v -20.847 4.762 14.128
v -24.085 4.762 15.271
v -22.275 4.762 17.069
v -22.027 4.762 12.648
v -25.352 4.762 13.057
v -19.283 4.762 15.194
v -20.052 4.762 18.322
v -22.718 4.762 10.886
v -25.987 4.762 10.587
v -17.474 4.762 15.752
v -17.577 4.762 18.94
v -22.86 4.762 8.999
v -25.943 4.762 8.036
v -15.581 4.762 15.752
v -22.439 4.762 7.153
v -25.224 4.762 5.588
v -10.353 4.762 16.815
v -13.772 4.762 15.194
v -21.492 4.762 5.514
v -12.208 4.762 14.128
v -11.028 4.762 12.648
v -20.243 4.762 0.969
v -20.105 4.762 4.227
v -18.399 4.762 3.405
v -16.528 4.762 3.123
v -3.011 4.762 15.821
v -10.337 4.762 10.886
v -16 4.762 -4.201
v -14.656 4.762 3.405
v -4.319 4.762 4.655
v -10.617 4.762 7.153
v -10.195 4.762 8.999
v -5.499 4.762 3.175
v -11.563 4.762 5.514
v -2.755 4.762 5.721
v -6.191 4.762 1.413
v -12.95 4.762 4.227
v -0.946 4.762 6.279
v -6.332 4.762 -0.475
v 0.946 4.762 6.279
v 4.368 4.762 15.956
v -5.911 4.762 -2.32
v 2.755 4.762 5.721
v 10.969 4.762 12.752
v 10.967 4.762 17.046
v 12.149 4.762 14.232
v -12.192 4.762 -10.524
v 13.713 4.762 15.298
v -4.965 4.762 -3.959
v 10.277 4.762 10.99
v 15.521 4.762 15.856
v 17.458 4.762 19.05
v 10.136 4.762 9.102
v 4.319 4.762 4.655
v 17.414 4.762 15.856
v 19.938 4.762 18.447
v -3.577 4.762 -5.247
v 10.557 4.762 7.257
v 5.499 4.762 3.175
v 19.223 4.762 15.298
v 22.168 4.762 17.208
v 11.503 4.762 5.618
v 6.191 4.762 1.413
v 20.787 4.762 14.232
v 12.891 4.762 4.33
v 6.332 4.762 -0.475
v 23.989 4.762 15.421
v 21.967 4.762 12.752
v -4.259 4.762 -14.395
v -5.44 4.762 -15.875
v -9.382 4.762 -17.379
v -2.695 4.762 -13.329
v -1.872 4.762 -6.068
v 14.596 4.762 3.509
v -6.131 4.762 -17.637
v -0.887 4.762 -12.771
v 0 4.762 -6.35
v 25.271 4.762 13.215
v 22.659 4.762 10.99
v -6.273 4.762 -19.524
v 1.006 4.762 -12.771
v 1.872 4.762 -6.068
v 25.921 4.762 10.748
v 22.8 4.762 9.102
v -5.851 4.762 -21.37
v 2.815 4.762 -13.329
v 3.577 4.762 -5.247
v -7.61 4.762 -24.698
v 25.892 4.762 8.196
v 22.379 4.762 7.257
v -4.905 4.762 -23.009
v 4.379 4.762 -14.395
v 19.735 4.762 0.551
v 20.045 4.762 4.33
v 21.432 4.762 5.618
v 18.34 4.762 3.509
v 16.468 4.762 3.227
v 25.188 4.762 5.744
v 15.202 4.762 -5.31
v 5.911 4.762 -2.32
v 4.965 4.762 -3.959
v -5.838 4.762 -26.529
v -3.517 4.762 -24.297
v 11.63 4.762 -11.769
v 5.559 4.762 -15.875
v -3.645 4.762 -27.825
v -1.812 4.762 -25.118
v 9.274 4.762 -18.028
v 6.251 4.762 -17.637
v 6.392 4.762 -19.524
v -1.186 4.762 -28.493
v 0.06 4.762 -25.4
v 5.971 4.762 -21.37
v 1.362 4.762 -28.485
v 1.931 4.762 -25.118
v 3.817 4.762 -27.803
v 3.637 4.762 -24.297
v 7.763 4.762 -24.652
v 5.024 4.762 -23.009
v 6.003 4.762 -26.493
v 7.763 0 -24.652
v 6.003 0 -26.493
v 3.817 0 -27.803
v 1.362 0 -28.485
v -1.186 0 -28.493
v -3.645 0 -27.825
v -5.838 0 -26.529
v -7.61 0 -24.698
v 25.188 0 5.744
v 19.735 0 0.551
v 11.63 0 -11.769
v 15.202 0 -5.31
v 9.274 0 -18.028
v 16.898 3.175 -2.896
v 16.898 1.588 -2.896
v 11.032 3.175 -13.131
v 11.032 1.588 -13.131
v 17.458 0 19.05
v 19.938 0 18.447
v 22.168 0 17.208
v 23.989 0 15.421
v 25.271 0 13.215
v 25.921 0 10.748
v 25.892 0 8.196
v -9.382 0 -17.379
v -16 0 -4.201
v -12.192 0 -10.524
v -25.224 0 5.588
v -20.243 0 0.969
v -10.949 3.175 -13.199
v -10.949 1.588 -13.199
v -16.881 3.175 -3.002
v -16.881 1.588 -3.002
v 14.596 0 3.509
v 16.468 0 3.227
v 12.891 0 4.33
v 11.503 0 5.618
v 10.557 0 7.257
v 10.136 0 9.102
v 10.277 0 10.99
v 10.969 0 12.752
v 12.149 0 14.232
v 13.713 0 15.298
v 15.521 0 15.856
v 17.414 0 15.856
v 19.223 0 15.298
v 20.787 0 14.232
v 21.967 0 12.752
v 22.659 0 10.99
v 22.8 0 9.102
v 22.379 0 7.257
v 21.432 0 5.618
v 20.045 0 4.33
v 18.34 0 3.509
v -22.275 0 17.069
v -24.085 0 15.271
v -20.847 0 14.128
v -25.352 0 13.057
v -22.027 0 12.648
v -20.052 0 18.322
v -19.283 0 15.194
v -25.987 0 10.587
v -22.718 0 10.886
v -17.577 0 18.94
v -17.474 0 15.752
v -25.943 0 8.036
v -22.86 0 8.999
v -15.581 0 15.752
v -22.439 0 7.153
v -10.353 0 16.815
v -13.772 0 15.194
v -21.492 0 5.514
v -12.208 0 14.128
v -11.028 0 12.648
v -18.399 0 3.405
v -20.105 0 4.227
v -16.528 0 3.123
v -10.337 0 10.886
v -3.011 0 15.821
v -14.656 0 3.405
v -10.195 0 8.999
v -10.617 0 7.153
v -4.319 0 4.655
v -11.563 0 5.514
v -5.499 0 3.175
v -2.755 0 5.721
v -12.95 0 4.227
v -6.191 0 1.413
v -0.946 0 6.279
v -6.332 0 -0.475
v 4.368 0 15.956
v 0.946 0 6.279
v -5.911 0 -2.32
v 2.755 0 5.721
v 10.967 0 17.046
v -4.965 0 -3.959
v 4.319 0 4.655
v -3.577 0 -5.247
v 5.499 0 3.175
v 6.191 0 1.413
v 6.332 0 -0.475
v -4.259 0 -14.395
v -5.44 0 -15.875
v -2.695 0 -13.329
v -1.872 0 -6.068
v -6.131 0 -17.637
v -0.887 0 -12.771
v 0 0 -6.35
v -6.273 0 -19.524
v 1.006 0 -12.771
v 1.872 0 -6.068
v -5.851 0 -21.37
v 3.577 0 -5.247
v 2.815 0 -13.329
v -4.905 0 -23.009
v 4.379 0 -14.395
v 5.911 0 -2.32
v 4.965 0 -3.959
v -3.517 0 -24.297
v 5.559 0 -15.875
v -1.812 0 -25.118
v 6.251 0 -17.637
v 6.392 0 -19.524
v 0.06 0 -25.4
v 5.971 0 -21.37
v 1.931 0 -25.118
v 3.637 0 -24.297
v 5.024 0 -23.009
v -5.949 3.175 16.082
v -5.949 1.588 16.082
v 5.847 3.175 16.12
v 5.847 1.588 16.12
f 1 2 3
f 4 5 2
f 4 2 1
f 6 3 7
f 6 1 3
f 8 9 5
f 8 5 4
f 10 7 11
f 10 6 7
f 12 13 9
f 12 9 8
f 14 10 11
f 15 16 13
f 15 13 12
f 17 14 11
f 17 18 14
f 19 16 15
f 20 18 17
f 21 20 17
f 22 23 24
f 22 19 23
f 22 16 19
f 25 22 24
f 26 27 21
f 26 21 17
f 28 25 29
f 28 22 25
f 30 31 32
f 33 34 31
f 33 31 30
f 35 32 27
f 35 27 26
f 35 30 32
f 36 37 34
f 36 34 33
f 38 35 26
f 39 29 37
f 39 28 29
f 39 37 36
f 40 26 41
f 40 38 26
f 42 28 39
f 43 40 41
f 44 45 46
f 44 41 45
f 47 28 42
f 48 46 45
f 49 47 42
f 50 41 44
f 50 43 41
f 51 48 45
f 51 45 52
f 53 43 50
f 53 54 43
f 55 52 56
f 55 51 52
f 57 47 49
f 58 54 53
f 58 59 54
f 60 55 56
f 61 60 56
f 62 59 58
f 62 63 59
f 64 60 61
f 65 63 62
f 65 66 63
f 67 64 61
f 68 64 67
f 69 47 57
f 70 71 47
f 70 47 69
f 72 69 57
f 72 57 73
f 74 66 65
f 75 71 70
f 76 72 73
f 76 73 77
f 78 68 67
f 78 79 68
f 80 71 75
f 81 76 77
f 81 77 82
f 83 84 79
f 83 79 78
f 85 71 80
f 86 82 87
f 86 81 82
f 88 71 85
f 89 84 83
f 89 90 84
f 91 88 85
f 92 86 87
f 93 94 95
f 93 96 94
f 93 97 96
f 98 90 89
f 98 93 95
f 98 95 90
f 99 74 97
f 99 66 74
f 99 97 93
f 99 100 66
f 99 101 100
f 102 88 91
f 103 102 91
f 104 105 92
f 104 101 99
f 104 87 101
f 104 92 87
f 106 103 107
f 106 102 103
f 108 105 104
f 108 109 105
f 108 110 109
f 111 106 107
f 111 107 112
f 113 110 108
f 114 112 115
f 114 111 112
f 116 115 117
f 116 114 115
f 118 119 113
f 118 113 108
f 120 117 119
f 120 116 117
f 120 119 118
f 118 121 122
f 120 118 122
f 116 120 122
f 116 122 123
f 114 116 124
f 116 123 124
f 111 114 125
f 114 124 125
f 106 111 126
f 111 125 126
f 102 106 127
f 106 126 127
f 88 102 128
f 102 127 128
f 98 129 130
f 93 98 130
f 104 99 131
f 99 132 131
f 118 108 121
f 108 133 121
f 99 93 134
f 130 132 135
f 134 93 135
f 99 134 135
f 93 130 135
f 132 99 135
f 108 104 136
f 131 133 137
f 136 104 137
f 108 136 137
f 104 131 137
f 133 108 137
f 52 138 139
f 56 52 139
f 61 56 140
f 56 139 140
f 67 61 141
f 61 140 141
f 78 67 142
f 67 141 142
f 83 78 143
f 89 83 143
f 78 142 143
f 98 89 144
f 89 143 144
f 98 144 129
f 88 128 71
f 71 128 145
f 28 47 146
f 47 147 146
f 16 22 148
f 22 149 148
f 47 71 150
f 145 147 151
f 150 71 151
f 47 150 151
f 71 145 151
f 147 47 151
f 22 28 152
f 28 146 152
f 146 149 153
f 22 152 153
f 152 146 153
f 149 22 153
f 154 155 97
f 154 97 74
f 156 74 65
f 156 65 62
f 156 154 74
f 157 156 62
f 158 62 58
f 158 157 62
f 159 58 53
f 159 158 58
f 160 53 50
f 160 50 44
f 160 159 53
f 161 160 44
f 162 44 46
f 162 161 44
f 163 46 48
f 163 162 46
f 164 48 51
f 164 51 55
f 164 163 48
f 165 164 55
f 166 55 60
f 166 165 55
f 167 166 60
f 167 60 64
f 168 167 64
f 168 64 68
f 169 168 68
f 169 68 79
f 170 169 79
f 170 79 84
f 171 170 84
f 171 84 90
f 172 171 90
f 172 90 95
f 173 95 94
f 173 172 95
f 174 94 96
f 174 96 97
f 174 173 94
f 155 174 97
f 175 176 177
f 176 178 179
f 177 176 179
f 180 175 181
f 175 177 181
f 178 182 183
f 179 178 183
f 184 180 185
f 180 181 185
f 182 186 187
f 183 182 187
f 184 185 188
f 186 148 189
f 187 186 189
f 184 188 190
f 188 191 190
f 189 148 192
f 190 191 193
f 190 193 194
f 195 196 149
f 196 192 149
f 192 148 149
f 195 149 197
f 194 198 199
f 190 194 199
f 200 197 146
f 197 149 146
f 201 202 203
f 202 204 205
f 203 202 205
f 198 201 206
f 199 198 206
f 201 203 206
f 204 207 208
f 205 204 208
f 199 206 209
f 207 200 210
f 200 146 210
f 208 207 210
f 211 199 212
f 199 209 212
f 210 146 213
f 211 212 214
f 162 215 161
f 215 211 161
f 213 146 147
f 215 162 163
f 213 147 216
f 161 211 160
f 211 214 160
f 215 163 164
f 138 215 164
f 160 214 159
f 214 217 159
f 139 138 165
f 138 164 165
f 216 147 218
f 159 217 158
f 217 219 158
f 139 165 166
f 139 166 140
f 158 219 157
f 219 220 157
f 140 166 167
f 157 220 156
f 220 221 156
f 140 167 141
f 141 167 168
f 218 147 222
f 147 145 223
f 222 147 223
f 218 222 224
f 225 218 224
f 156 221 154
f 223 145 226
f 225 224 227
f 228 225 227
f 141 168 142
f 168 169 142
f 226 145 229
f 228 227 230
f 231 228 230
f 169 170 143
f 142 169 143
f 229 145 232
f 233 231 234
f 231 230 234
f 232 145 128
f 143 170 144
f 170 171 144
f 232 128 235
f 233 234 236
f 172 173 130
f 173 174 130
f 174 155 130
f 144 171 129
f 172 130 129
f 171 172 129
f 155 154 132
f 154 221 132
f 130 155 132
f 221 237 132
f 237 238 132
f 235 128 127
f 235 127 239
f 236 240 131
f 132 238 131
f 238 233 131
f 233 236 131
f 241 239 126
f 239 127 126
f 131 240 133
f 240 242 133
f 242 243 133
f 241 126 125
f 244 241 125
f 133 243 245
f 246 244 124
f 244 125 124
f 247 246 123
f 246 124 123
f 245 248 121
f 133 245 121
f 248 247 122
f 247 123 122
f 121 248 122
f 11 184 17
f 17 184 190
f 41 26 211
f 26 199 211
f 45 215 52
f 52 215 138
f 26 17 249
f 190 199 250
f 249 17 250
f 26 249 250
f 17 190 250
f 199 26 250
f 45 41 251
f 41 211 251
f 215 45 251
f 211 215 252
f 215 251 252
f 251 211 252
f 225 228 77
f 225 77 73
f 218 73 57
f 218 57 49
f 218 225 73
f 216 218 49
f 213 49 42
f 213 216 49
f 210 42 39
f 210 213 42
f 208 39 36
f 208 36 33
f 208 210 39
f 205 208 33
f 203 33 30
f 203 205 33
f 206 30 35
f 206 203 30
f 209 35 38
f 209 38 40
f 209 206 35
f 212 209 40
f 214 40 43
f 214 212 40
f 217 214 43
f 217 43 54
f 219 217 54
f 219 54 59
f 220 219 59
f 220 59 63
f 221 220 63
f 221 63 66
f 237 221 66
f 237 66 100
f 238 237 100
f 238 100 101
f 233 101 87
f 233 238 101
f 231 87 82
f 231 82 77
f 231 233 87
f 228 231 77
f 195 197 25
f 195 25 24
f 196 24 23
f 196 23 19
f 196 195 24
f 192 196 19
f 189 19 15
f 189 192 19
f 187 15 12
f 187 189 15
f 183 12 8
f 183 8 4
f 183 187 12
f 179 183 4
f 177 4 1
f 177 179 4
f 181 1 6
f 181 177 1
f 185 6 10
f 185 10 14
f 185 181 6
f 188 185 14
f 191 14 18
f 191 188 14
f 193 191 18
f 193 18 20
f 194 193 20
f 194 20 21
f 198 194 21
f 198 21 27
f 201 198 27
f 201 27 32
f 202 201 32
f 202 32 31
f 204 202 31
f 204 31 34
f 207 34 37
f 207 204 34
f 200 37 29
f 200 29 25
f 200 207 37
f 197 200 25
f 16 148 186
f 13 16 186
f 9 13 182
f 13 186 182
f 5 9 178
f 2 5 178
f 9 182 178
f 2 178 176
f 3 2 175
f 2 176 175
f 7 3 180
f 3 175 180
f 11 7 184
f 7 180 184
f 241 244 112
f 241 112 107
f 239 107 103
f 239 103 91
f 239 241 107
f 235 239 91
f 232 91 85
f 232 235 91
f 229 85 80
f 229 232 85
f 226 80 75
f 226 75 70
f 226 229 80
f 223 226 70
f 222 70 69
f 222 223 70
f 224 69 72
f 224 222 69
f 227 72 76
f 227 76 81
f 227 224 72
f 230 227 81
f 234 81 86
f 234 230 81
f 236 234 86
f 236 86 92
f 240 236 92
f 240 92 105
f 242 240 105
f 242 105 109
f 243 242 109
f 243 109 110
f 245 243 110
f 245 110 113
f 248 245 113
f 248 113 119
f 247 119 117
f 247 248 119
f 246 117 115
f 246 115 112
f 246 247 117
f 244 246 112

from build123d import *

# Parameters (mm, degrees)
SKETCH2_R           = 6.35
BOSS_EXTRUDE1_DEPTH = 4.7625


with BuildPart() as part:
    # Sketch2 → Boss-Extrude1 (new body)
    with BuildSketch(Plane(origin=(0, 0, 0), x_dir=(1, 0, 0), z_dir=(0, 1, 0))):
        with BuildLine():
            ThreePointArc((7.763480479, 24.65151799), (0.088455744, 28.574863042), (-7.61008297, 24.69786127))
            add(Edge.make_bspline(
                [(-7.61008297, 24.69786127), (-9.592104105, 12.649393813), (-15.73585932, 2.097225899), (-25.22422914, -5.588137723)],
                knots=[0, 0, 0, 0, 1, 1, 1, 1], degree=3))
            ThreePointArc((-25.22422914, -5.588137723), (-24.792958655, -14.207033662), (-17.57711737, -18.940213988))
            add(Edge.make_bspline(
                [(-17.57711737, -18.940213988), (-6.152008529, -14.631981889), (6.058316415, -14.676034081), (17.458404858, -19.050043608)],
                knots=[0, 0, 0, 0, 1, 1, 1, 1], degree=3))
            ThreePointArc((17.458404858, -19.050043608), (24.704052244, -14.361071884), (25.187751026, -5.744117819))
            add(Edge.make_bspline(
                [(25.187751026, -5.744117819), (15.743744455, 1.995695857), (9.676165927, 12.591849246), (7.763480479, 24.65151799)],
                knots=[0, 0, 0, 0, 1, 1, 1, 1], degree=3))
        make_face()
        with Locations(Location((0, 0, 0), (0, 0, 90))):
            Circle(SKETCH2_R, mode=Mode.SUBTRACT)
        with Locations(Location((0.059742965, 19.049906319, 0), (0, 0, 90))):
            Circle(SKETCH2_R, mode=Mode.SUBTRACT)
        with Locations(Location((16.46783133, -9.576692085, 0), (0, 0, 90))):
            Circle(SKETCH2_R, mode=Mode.SUBTRACT)
        with Locations(Location((-16.527574295, -9.473214235, 0), (0, 0, 90))):
            Circle(SKETCH2_R, mode=Mode.SUBTRACT)
    extrude(amount=BOSS_EXTRUDE1_DEPTH)


solid = part.part
